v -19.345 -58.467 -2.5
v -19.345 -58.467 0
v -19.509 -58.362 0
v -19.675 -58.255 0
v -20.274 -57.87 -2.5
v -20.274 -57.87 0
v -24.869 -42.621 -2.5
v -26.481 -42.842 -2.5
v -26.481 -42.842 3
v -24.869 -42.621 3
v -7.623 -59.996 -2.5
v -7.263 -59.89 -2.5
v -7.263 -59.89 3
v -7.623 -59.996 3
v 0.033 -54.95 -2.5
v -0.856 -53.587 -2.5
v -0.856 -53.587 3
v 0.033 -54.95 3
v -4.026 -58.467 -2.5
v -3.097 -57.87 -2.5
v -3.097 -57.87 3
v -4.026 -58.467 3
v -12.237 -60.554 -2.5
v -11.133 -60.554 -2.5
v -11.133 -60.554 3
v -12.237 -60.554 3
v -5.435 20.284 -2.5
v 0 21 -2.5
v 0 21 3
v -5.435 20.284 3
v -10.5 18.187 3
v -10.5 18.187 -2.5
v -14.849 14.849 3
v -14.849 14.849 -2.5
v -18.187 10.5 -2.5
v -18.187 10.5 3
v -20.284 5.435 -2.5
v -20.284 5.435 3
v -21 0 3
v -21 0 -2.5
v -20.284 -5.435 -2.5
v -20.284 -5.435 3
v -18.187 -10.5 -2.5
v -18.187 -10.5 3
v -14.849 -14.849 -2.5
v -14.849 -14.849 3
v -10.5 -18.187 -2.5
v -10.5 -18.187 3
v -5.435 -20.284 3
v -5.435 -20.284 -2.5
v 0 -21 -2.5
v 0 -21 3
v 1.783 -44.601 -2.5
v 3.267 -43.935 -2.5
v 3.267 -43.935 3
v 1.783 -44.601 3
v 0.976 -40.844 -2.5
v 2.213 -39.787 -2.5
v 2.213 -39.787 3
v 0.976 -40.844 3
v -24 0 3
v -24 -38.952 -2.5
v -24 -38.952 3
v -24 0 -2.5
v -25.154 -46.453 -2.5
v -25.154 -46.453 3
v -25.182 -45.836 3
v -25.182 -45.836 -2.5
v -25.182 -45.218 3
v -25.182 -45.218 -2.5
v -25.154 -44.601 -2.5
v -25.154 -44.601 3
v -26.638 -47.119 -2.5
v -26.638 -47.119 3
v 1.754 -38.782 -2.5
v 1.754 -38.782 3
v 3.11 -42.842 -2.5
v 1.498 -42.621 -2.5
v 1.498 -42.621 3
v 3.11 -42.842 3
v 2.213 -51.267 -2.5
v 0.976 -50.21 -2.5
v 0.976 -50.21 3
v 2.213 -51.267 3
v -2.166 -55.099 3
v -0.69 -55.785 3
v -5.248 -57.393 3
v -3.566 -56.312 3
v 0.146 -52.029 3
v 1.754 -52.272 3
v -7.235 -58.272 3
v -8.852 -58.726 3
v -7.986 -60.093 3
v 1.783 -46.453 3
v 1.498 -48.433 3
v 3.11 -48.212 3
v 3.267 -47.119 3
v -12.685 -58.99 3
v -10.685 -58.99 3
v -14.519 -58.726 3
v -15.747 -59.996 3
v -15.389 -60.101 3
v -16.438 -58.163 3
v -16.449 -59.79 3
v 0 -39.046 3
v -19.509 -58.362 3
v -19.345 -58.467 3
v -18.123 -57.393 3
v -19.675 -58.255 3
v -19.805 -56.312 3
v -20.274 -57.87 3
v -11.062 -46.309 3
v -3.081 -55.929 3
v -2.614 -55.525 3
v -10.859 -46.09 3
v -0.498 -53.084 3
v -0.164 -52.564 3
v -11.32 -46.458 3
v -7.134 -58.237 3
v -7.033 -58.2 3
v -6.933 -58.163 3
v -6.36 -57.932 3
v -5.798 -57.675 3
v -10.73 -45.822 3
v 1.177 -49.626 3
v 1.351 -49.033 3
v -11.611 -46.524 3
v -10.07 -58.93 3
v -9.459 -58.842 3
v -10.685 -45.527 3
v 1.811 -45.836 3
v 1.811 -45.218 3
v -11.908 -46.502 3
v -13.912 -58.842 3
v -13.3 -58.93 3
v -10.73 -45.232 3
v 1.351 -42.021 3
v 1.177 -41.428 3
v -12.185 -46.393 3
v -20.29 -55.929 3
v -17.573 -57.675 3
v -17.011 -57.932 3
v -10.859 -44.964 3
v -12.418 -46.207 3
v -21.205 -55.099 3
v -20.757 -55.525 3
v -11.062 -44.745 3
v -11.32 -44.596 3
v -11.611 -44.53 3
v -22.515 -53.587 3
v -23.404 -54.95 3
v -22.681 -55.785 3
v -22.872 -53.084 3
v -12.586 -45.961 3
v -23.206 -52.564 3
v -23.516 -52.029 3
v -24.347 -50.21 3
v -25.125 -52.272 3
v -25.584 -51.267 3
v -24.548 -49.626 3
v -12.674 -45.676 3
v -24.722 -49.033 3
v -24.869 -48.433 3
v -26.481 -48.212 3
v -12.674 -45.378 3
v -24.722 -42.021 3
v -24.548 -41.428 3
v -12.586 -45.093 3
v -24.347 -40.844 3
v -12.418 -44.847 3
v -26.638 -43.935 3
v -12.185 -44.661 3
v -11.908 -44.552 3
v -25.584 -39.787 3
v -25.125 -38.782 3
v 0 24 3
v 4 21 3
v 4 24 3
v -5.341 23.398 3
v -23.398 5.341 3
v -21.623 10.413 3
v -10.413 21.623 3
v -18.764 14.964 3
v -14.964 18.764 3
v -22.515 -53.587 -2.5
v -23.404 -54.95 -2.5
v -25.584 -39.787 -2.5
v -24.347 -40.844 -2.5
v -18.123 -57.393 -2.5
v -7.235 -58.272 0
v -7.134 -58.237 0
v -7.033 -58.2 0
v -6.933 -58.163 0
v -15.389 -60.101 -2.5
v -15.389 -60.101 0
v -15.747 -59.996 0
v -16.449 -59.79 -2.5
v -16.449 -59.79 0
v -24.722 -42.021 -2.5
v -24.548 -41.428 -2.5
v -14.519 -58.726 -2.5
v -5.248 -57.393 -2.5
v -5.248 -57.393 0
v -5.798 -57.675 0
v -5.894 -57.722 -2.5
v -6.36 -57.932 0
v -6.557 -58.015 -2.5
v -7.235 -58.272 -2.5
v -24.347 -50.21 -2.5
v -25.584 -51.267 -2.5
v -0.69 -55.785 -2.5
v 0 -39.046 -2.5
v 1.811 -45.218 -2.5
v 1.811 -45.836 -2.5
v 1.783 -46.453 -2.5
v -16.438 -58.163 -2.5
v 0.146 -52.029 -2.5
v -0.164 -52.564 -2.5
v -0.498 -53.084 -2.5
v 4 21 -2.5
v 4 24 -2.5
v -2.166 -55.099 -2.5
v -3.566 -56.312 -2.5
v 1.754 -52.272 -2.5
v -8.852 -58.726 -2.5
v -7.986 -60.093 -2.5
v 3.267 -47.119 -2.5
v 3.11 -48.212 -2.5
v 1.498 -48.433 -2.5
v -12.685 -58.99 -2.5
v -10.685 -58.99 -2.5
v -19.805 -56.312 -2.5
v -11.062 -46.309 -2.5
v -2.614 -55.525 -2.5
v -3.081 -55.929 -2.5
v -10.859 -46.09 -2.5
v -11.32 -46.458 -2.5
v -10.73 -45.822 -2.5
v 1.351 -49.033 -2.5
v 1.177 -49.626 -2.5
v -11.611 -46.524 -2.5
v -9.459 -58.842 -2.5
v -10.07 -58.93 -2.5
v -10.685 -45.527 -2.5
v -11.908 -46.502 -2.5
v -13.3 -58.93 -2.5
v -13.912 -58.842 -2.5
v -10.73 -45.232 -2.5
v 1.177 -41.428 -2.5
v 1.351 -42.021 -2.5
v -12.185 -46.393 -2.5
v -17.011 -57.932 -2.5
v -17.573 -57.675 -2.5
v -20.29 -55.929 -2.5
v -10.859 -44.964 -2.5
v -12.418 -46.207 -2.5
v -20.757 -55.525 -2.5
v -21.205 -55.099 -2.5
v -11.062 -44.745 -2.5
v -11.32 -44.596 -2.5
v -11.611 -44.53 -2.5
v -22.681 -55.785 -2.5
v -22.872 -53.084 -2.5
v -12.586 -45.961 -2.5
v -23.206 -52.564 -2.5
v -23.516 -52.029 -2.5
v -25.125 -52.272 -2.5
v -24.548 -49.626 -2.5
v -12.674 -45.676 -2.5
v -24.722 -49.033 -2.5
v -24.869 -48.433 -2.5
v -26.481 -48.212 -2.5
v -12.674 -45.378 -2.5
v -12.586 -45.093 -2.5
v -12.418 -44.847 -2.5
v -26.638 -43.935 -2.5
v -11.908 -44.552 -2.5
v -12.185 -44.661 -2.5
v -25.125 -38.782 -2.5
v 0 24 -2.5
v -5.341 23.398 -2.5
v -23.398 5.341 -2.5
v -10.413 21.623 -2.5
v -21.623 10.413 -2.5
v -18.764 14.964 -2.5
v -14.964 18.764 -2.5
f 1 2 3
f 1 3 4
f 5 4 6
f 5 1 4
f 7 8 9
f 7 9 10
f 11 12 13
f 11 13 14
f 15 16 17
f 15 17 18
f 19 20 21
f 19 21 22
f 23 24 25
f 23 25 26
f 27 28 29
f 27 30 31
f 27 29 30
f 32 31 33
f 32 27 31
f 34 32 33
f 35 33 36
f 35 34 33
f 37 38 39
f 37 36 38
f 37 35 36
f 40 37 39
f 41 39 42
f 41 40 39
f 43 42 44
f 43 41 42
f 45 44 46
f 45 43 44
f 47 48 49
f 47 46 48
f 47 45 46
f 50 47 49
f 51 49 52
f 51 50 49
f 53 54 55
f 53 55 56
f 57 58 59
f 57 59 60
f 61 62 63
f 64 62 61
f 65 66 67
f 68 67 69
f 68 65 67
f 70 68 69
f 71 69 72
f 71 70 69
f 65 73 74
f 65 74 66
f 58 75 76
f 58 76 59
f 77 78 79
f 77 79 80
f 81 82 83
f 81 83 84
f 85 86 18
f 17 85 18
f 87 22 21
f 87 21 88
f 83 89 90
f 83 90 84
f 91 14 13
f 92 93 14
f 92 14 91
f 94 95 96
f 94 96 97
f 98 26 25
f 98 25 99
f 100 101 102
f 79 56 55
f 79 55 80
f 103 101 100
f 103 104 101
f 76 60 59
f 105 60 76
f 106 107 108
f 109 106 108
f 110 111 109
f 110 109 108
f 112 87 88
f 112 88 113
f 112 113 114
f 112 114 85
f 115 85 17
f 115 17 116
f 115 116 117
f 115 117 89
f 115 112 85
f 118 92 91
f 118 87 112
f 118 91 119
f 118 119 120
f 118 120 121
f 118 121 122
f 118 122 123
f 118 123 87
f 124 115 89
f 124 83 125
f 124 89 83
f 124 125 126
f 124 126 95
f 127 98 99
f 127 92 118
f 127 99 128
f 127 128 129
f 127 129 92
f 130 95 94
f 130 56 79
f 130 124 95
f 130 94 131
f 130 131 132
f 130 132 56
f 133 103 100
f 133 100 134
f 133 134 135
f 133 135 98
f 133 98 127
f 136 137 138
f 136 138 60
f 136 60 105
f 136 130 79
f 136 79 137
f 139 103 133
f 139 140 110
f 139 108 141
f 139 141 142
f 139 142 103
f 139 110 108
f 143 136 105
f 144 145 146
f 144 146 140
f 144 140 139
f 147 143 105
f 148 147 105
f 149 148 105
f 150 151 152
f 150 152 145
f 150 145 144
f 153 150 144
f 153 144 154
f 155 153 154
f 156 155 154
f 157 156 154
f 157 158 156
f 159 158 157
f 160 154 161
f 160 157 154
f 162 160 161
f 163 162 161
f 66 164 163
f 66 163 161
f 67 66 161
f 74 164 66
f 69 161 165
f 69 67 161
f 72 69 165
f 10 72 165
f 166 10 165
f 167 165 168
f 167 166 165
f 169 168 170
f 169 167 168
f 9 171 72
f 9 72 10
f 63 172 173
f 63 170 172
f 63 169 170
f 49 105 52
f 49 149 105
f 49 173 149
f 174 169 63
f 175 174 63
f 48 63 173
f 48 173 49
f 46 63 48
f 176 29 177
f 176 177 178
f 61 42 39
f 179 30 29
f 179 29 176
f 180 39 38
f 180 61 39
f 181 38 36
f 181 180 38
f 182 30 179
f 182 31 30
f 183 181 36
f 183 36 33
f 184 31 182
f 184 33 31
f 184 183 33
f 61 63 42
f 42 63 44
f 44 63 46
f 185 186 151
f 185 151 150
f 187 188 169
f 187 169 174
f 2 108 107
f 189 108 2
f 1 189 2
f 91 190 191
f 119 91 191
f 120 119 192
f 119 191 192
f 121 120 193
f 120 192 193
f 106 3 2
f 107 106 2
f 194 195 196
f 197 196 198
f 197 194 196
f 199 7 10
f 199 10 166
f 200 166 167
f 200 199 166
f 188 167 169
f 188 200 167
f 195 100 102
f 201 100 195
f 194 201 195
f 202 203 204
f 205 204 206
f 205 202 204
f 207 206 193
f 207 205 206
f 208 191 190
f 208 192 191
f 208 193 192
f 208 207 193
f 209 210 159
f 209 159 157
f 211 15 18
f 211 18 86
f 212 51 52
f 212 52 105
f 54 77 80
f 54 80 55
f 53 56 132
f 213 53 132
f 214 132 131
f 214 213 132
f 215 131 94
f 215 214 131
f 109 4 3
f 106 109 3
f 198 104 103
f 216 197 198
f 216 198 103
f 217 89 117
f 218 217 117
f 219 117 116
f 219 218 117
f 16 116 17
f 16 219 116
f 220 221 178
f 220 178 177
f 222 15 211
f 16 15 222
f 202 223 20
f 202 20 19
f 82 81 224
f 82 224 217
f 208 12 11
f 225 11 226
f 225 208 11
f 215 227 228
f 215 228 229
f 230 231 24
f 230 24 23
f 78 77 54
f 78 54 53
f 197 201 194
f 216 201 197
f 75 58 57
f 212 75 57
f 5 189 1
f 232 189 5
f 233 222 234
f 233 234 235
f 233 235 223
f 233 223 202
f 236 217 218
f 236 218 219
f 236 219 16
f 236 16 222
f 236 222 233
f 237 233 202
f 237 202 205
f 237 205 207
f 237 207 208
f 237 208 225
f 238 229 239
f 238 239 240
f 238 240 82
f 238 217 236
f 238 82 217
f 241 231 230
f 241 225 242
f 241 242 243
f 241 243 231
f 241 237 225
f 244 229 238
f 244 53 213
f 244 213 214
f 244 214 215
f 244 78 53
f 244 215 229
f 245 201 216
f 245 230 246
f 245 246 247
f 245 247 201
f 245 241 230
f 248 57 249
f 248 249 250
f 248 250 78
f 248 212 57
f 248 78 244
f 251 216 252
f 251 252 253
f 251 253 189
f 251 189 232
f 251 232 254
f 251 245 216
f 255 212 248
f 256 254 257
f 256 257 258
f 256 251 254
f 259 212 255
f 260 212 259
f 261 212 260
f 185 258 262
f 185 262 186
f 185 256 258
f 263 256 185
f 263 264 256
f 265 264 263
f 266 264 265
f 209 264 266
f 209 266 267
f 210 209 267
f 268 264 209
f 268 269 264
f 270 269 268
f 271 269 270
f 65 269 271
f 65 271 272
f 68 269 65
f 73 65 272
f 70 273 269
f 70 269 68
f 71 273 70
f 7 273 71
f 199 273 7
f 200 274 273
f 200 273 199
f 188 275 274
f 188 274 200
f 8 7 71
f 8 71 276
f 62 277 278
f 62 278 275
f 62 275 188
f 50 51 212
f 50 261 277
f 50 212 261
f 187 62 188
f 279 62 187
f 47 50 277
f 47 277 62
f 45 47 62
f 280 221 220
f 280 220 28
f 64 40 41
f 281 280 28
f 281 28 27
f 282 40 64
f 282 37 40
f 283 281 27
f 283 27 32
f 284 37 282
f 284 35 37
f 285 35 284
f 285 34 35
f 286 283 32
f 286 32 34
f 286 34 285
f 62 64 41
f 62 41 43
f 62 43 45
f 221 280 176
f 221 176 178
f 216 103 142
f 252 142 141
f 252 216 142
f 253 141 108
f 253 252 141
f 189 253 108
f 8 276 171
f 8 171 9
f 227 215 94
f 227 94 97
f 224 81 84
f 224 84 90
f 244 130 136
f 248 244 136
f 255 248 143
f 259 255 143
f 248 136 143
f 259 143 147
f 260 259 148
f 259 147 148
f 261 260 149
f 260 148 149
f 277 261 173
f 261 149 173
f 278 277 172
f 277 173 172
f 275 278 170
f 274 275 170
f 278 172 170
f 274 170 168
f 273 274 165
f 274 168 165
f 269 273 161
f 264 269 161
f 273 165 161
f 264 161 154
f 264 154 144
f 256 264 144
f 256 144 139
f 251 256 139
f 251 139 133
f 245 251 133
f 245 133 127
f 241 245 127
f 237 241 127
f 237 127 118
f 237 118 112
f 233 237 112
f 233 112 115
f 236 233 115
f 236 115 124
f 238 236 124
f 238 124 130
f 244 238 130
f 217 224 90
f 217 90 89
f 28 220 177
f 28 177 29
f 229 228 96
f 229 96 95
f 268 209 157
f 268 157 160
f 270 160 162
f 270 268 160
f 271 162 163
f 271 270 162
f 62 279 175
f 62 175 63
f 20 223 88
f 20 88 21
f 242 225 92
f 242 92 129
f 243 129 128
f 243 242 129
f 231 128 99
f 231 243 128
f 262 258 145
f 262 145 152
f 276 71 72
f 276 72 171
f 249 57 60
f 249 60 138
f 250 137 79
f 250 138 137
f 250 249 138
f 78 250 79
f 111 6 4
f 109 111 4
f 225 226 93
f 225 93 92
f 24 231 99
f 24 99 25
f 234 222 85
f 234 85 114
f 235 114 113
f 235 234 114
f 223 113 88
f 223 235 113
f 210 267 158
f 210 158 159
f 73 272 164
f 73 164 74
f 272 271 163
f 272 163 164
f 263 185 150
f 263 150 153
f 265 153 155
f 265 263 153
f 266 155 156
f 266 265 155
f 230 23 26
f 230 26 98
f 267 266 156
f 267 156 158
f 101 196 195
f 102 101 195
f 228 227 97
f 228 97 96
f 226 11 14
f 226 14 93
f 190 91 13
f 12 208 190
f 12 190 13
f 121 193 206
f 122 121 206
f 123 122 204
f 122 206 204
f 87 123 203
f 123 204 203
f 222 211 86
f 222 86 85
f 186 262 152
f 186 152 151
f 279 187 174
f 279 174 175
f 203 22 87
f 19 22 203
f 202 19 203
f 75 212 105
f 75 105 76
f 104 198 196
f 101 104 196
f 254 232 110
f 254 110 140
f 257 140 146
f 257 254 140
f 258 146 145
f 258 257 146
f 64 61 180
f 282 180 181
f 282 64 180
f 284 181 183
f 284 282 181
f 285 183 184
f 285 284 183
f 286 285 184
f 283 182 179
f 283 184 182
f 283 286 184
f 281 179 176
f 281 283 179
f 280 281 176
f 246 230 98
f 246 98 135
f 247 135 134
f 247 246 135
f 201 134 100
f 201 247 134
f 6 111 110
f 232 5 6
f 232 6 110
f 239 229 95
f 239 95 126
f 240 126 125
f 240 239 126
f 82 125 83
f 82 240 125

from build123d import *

# Parameters (mm, degrees)
BOSS_EXTRUDE1_DEPTH = 3
SKETCH3_W           = 3
SKETCH3_H           = 3
BOSS_EXTRUDE2_DEPTH = 4
BOSS_EXTRUDE3_START = 2.5
BOSS_EXTRUDE3_DEPTH = 2.5
CUT_EXTRUDE1_REACH  = 68.382
SKETCH5_R           = 1


with BuildPart() as part:
    # Sketch1 → Boss-Extrude1 (new body)
    with BuildSketch(Plane.XY):
        with BuildLine():
            ThreePointArc((0, -21), (-21, 0), (0, 21))
            Line((0, 21), (0, 24))
            ThreePointArc((0, 24), (-16.970562748, 16.970562748), (-24, 0))
            Line((-24, 0), (-24, -38.951706039))
            Line((-24, -38.951706039), (-25.1251405, -38.782264509))
            Line((-25.1251405, -38.782264509), (-25.583788433, -39.786563393))
            Line((-25.583788433, -39.786563393), (-24.347066616, -40.843822809))
            ThreePointArc((-24.347066616, -40.843822809), (-24.638511224, -41.723497067), (-24.868920228, -42.621092996))
            Line((-24.868920228, -42.621092996), (-26.480914421, -42.841893921))
            Line((-26.480914421, -42.841893921), (-26.638040197, -43.934727699))
            Line((-26.638040197, -43.934727699), (-25.153549904, -44.60073588))
            ThreePointArc((-25.153549904, -44.60073588), (-25.18535608, -45.526886585), (-25.153549904, -46.453037289))
            Line((-25.153549904, -46.453037289), (-26.638040197, -47.119045471))
            Line((-26.638040197, -47.119045471), (-26.48091442, -48.211879248))
            Line((-26.48091442, -48.211879248), (-24.868920228, -48.432680173))
            ThreePointArc((-24.868920228, -48.432680173), (-24.638511224, -49.330276102), (-24.347066616, -50.20995036))
            Line((-24.347066616, -50.20995036), (-25.583788433, -51.267209776))
            Line((-25.583788433, -51.267209776), (-25.1251405, -52.271508661))
            Line((-25.1251405, -52.271508661), (-23.516236589, -52.029214351))
            ThreePointArc((-23.516236589, -52.029214351), (-23.042278774, -52.82553762), (-22.514806841, -53.587469455))
            Line((-22.514806841, -53.587469455), (-23.403568337, -54.950327236))
            Line((-23.403568337, -54.950327236), (-22.680555175, -55.784728904))
            Line((-22.680555175, -55.784728904), (-21.205085373, -55.098968604))
            ThreePointArc((-21.205085373, -55.098968604), (-20.525975989, -55.729505838), (-19.805209372, -56.311968064))
            Line((-19.805209372, -56.311968064), (-20.274008375, -57.870013577))
            Line((-20.274008375, -57.870013577), (-19.674605945, -58.255226128))
            Line((-19.674605945, -58.255226128), (-19.50868057, -58.361859893))
            Line((-19.50868057, -58.361859893), (-19.345204211, -58.466919769))
            Line((-19.345204211, -58.466919769), (-18.122702306, -57.393249699))
            ThreePointArc((-18.122702306, -57.393249699), (-17.293458756, -57.806918522), (-16.437789679, -58.162723513))
            Line((-16.437789679, -58.162723513), (-16.448646882, -59.789733177))
            Line((-16.448646882, -59.789733177), (-15.747386057, -59.995641934))
            Line((-15.747386057, -59.995641934), (-15.389297906, -60.100786102))
            Line((-15.389297906, -60.100786102), (-14.518803732, -58.726188627))
            ThreePointArc((-14.518803732, -58.726188627), (-13.606606397, -58.88947605), (-12.68535608, -58.989798602))
            Line((-12.68535608, -58.989798602), (-12.237391898, -60.553961771))
            Line((-12.237391898, -60.553961771), (-11.133320263, -60.553961771))
            Line((-11.133320263, -60.553961771), (-10.68535608, -58.989798602))
            ThreePointArc((-10.68535608, -58.989798602), (-9.764105764, -58.88947605), (-8.851908429, -58.726188627))
            Line((-8.851908429, -58.726188627), (-7.986392322, -60.092925234))
            Line((-7.986392322, -60.092925234), (-7.623326104, -59.995641934))
            Line((-7.623326104, -59.995641934), (-7.262677826, -59.889746045))
            Line((-7.262677826, -59.889746045), (-7.234972221, -58.272241954))
            ThreePointArc((-7.234972221, -58.272241954), (-7.083621531, -58.21838134), (-6.932922481, -58.162723513))
            ThreePointArc((-6.932922481, -58.162723513), (-6.077253405, -57.806918522), (-5.248009855, -57.393249699))
            Line((-5.248009855, -57.393249699), (-4.025507949, -58.466919769))
            Line((-4.025507949, -58.466919769), (-3.096703786, -57.870013577))
            Line((-3.096703786, -57.870013577), (-3.565502789, -56.311968064))
            ThreePointArc((-3.565502789, -56.311968064), (-2.844736172, -55.729505838), (-2.165626787, -55.098968604))
            Line((-2.165626787, -55.098968604), (-0.690156985, -55.784728904))
            Line((-0.690156985, -55.784728904), (0.032856176, -54.950327236))
            Line((0.032856176, -54.950327236), (-0.855905319, -53.587469455))
            ThreePointArc((-0.855905319, -53.587469455), (-0.328433387, -52.82553762), (0.145524429, -52.029214351))
            Line((0.145524429, -52.029214351), (1.754428339, -52.27150866))
            Line((1.754428339, -52.27150866), (2.213076272, -51.267209776))
            Line((2.213076272, -51.267209776), (0.976354455, -50.20995036))
            ThreePointArc((0.976354455, -50.20995036), (1.267799063, -49.330276102), (1.498208067, -48.432680173))
            Line((1.498208067, -48.432680173), (3.11020226, -48.211879248))
            Line((3.11020226, -48.211879248), (3.267328036, -47.11904547))
            Line((3.267328036, -47.11904547), (1.782837743, -46.453037289))
            ThreePointArc((1.782837743, -46.453037289), (1.81464392, -45.526886584), (1.782837743, -44.60073588))
            Line((1.782837743, -44.60073588), (3.267328036, -43.934727698))
            Line((3.267328036, -43.934727698), (3.11020226, -42.84189392))
            Line((3.11020226, -42.84189392), (1.498208067, -42.621092996))
            ThreePointArc((1.498208067, -42.621092996), (1.267799063, -41.723497067), (0.976354455, -40.843822809))
            Line((0.976354455, -40.843822809), (2.213076272, -39.786563393))
            Line((2.213076272, -39.786563393), (1.754428339, -38.782264508))
            Line((1.754428339, -38.782264508), (0, -39.046474198))
            Line((0, -39.046474198), (0, -36.153828735))
            Line((0, -36.153828735), (0, -36.065527885))
            Line((0, -36.065527885), (0, -21))
        make_face()
    extrude(amount=BOSS_EXTRUDE1_DEPTH)

    # Sketch3 → Boss-Extrude2 (add)
    with BuildSketch(Plane(origin=(0, 0, 0), x_dir=(0, 0, -1), z_dir=(1, 0, 0))):
        with Locations((-1.5, 22.5)):
            Rectangle(SKETCH3_W, SKETCH3_H)
    extrude(amount=BOSS_EXTRUDE2_DEPTH)

    # Sketch4 → Boss-Extrude3 (add)
    with BuildSketch(Plane(origin=(0, 0, 0), x_dir=(-1, 0, 0), z_dir=(0, 0, -1)).offset(BOSS_EXTRUDE3_START)):
        with BuildLine():
            Line((-1.498208067, -42.621092996), (-3.11020226, -42.84189392))
            Line((-3.11020226, -42.84189392), (-3.267328036, -43.934727698))
            Line((-3.267328036, -43.934727698), (-1.782837743, -44.60073588))
            ThreePointArc((-1.782837743, -44.60073588), (-1.81464392, -45.526886584), (-1.782837743, -46.453037289))
            Line((-1.782837743, -46.453037289), (-3.267328036, -47.11904547))
            Line((-3.267328036, -47.11904547), (-3.11020226, -48.211879248))
            Line((-3.11020226, -48.211879248), (-1.498208067, -48.432680173))
            ThreePointArc((-1.498208067, -48.432680173), (-1.267799063, -49.330276102), (-0.976354455, -50.20995036))
            Line((-0.976354455, -50.20995036), (-2.213076272, -51.267209776))
            Line((-2.213076272, -51.267209776), (-1.754428339, -52.27150866))
            Line((-1.754428339, -52.27150866), (-0.145524429, -52.029214351))
            ThreePointArc((-0.145524429, -52.029214351), (0.328433387, -52.82553762), (0.855905319, -53.587469455))
            Line((0.855905319, -53.587469455), (-0.032856176, -54.950327236))
            Line((-0.032856176, -54.950327236), (0.690156985, -55.784728904))
            Line((0.690156985, -55.784728904), (2.165626787, -55.098968604))
            ThreePointArc((2.165626787, -55.098968604), (2.844736172, -55.729505838), (3.565502789, -56.311968064))
            Line((3.565502789, -56.311968064), (3.096703786, -57.870013577))
            Line((3.096703786, -57.870013577), (4.025507949, -58.466919769))
            Line((4.025507949, -58.466919769), (5.248009855, -57.393249699))
            ThreePointArc((5.248009855, -57.393249699), (6.223779069, -57.872783739), (7.234972221, -58.272241954))
            Line((7.234972221, -58.272241954), (7.262677826, -59.889746045))
            Line((7.262677826, -59.889746045), (7.623326104, -59.995641934))
            Line((7.623326104, -59.995641934), (7.986392322, -60.092925234))
            Line((7.986392322, -60.092925234), (8.851908429, -58.726188627))
            ThreePointArc((8.851908429, -58.726188627), (9.764105764, -58.88947605), (10.68535608, -58.989798602))
            Line((10.68535608, -58.989798602), (11.133320263, -60.553961771))
            Line((11.133320263, -60.553961771), (12.237391898, -60.553961771))
            Line((12.237391898, -60.553961771), (12.68535608, -58.989798602))
            ThreePointArc((12.68535608, -58.989798602), (13.606606397, -58.88947605), (14.518803732, -58.726188627))
            Line((14.518803732, -58.726188627), (15.389297906, -60.100786102))
            Line((15.389297906, -60.100786102), (16.448646882, -59.789733177))
            Line((16.448646882, -59.789733177), (16.437789679, -58.162723513))
            ThreePointArc((16.437789679, -58.162723513), (17.293458756, -57.806918522), (18.122702306, -57.393249699))
            Line((18.122702306, -57.393249699), (19.345204211, -58.466919769))
            Line((19.345204211, -58.466919769), (20.274008375, -57.870013577))
            Line((20.274008375, -57.870013577), (19.805209372, -56.311968064))
            ThreePointArc((19.805209372, -56.311968064), (20.525975989, -55.729505838), (21.205085373, -55.098968604))
            Line((21.205085373, -55.098968604), (22.680555175, -55.784728904))
            Line((22.680555175, -55.784728904), (23.403568337, -54.950327236))
            Line((23.403568337, -54.950327236), (22.514806841, -53.587469455))
            ThreePointArc((22.514806841, -53.587469455), (23.042278774, -52.82553762), (23.516236589, -52.029214351))
            Line((23.516236589, -52.029214351), (25.1251405, -52.271508661))
            Line((25.1251405, -52.271508661), (25.583788433, -51.267209776))
            Line((25.583788433, -51.267209776), (24.347066616, -50.20995036))
            ThreePointArc((24.347066616, -50.20995036), (24.638511224, -49.330276102), (24.868920228, -48.432680173))
            Line((24.868920228, -48.432680173), (26.48091442, -48.211879248))
            Line((26.48091442, -48.211879248), (26.638040197, -47.119045471))
            Line((26.638040197, -47.119045471), (25.153549904, -46.453037289))
            ThreePointArc((25.153549904, -46.453037289), (25.18535608, -45.526886585), (25.153549904, -44.60073588))
            Line((25.153549904, -44.60073588), (26.638040197, -43.934727699))
            Line((26.638040197, -43.934727699), (26.480914421, -42.841893921))
            Line((26.480914421, -42.841893921), (24.868920228, -42.621092996))
            ThreePointArc((24.868920228, -42.621092996), (24.638511224, -41.723497067), (24.347066616, -40.843822809))
            Line((24.347066616, -40.843822809), (25.583788433, -39.786563393))
            Line((25.583788433, -39.786563393), (25.1251405, -38.782264509))
            Line((25.1251405, -38.782264509), (24, -38.951706039))
            Line((24, -38.951706039), (24, 0))
            ThreePointArc((24, 0), (16.970562748, 16.970562748), (0, 24))
            Line((0, 24), (-4, 24))
            Line((-4, 24), (-4, 21))
            Line((-4, 21), (0, 21))
            ThreePointArc((0, 21), (21, 0), (0, -21))
            Line((0, -21), (0, -39.046474198))
            Line((0, -39.046474198), (-1.754428339, -38.782264508))
            Line((-1.754428339, -38.782264508), (-2.213076272, -39.786563393))
            Line((-2.213076272, -39.786563393), (-0.976354455, -40.843822809))
            ThreePointArc((-0.976354455, -40.843822809), (-1.267799063, -41.723497067), (-1.498208067, -42.621092996))
        make_face()
    extrude(amount=-BOSS_EXTRUDE3_DEPTH)

    # Sketch5 → Cut-Extrude1 (cut, up to next)
    with BuildSketch(Plane.XY.offset(3), mode=Mode.PRIVATE) as cut_extrude1_sk1:
        with Locations((-11.68535608, -45.526886584)):
            Circle(SKETCH5_R)
    cut_extrude1_tool1 = extrude(cut_extrude1_sk1.sketch, amount=-CUT_EXTRUDE1_REACH, mode=Mode.PRIVATE) & part.part
    add(cut_extrude1_tool1.solids().sort_by_distance((-11.685356, -45.526887, 3))[0], mode=Mode.SUBTRACT)


solid = part.part
